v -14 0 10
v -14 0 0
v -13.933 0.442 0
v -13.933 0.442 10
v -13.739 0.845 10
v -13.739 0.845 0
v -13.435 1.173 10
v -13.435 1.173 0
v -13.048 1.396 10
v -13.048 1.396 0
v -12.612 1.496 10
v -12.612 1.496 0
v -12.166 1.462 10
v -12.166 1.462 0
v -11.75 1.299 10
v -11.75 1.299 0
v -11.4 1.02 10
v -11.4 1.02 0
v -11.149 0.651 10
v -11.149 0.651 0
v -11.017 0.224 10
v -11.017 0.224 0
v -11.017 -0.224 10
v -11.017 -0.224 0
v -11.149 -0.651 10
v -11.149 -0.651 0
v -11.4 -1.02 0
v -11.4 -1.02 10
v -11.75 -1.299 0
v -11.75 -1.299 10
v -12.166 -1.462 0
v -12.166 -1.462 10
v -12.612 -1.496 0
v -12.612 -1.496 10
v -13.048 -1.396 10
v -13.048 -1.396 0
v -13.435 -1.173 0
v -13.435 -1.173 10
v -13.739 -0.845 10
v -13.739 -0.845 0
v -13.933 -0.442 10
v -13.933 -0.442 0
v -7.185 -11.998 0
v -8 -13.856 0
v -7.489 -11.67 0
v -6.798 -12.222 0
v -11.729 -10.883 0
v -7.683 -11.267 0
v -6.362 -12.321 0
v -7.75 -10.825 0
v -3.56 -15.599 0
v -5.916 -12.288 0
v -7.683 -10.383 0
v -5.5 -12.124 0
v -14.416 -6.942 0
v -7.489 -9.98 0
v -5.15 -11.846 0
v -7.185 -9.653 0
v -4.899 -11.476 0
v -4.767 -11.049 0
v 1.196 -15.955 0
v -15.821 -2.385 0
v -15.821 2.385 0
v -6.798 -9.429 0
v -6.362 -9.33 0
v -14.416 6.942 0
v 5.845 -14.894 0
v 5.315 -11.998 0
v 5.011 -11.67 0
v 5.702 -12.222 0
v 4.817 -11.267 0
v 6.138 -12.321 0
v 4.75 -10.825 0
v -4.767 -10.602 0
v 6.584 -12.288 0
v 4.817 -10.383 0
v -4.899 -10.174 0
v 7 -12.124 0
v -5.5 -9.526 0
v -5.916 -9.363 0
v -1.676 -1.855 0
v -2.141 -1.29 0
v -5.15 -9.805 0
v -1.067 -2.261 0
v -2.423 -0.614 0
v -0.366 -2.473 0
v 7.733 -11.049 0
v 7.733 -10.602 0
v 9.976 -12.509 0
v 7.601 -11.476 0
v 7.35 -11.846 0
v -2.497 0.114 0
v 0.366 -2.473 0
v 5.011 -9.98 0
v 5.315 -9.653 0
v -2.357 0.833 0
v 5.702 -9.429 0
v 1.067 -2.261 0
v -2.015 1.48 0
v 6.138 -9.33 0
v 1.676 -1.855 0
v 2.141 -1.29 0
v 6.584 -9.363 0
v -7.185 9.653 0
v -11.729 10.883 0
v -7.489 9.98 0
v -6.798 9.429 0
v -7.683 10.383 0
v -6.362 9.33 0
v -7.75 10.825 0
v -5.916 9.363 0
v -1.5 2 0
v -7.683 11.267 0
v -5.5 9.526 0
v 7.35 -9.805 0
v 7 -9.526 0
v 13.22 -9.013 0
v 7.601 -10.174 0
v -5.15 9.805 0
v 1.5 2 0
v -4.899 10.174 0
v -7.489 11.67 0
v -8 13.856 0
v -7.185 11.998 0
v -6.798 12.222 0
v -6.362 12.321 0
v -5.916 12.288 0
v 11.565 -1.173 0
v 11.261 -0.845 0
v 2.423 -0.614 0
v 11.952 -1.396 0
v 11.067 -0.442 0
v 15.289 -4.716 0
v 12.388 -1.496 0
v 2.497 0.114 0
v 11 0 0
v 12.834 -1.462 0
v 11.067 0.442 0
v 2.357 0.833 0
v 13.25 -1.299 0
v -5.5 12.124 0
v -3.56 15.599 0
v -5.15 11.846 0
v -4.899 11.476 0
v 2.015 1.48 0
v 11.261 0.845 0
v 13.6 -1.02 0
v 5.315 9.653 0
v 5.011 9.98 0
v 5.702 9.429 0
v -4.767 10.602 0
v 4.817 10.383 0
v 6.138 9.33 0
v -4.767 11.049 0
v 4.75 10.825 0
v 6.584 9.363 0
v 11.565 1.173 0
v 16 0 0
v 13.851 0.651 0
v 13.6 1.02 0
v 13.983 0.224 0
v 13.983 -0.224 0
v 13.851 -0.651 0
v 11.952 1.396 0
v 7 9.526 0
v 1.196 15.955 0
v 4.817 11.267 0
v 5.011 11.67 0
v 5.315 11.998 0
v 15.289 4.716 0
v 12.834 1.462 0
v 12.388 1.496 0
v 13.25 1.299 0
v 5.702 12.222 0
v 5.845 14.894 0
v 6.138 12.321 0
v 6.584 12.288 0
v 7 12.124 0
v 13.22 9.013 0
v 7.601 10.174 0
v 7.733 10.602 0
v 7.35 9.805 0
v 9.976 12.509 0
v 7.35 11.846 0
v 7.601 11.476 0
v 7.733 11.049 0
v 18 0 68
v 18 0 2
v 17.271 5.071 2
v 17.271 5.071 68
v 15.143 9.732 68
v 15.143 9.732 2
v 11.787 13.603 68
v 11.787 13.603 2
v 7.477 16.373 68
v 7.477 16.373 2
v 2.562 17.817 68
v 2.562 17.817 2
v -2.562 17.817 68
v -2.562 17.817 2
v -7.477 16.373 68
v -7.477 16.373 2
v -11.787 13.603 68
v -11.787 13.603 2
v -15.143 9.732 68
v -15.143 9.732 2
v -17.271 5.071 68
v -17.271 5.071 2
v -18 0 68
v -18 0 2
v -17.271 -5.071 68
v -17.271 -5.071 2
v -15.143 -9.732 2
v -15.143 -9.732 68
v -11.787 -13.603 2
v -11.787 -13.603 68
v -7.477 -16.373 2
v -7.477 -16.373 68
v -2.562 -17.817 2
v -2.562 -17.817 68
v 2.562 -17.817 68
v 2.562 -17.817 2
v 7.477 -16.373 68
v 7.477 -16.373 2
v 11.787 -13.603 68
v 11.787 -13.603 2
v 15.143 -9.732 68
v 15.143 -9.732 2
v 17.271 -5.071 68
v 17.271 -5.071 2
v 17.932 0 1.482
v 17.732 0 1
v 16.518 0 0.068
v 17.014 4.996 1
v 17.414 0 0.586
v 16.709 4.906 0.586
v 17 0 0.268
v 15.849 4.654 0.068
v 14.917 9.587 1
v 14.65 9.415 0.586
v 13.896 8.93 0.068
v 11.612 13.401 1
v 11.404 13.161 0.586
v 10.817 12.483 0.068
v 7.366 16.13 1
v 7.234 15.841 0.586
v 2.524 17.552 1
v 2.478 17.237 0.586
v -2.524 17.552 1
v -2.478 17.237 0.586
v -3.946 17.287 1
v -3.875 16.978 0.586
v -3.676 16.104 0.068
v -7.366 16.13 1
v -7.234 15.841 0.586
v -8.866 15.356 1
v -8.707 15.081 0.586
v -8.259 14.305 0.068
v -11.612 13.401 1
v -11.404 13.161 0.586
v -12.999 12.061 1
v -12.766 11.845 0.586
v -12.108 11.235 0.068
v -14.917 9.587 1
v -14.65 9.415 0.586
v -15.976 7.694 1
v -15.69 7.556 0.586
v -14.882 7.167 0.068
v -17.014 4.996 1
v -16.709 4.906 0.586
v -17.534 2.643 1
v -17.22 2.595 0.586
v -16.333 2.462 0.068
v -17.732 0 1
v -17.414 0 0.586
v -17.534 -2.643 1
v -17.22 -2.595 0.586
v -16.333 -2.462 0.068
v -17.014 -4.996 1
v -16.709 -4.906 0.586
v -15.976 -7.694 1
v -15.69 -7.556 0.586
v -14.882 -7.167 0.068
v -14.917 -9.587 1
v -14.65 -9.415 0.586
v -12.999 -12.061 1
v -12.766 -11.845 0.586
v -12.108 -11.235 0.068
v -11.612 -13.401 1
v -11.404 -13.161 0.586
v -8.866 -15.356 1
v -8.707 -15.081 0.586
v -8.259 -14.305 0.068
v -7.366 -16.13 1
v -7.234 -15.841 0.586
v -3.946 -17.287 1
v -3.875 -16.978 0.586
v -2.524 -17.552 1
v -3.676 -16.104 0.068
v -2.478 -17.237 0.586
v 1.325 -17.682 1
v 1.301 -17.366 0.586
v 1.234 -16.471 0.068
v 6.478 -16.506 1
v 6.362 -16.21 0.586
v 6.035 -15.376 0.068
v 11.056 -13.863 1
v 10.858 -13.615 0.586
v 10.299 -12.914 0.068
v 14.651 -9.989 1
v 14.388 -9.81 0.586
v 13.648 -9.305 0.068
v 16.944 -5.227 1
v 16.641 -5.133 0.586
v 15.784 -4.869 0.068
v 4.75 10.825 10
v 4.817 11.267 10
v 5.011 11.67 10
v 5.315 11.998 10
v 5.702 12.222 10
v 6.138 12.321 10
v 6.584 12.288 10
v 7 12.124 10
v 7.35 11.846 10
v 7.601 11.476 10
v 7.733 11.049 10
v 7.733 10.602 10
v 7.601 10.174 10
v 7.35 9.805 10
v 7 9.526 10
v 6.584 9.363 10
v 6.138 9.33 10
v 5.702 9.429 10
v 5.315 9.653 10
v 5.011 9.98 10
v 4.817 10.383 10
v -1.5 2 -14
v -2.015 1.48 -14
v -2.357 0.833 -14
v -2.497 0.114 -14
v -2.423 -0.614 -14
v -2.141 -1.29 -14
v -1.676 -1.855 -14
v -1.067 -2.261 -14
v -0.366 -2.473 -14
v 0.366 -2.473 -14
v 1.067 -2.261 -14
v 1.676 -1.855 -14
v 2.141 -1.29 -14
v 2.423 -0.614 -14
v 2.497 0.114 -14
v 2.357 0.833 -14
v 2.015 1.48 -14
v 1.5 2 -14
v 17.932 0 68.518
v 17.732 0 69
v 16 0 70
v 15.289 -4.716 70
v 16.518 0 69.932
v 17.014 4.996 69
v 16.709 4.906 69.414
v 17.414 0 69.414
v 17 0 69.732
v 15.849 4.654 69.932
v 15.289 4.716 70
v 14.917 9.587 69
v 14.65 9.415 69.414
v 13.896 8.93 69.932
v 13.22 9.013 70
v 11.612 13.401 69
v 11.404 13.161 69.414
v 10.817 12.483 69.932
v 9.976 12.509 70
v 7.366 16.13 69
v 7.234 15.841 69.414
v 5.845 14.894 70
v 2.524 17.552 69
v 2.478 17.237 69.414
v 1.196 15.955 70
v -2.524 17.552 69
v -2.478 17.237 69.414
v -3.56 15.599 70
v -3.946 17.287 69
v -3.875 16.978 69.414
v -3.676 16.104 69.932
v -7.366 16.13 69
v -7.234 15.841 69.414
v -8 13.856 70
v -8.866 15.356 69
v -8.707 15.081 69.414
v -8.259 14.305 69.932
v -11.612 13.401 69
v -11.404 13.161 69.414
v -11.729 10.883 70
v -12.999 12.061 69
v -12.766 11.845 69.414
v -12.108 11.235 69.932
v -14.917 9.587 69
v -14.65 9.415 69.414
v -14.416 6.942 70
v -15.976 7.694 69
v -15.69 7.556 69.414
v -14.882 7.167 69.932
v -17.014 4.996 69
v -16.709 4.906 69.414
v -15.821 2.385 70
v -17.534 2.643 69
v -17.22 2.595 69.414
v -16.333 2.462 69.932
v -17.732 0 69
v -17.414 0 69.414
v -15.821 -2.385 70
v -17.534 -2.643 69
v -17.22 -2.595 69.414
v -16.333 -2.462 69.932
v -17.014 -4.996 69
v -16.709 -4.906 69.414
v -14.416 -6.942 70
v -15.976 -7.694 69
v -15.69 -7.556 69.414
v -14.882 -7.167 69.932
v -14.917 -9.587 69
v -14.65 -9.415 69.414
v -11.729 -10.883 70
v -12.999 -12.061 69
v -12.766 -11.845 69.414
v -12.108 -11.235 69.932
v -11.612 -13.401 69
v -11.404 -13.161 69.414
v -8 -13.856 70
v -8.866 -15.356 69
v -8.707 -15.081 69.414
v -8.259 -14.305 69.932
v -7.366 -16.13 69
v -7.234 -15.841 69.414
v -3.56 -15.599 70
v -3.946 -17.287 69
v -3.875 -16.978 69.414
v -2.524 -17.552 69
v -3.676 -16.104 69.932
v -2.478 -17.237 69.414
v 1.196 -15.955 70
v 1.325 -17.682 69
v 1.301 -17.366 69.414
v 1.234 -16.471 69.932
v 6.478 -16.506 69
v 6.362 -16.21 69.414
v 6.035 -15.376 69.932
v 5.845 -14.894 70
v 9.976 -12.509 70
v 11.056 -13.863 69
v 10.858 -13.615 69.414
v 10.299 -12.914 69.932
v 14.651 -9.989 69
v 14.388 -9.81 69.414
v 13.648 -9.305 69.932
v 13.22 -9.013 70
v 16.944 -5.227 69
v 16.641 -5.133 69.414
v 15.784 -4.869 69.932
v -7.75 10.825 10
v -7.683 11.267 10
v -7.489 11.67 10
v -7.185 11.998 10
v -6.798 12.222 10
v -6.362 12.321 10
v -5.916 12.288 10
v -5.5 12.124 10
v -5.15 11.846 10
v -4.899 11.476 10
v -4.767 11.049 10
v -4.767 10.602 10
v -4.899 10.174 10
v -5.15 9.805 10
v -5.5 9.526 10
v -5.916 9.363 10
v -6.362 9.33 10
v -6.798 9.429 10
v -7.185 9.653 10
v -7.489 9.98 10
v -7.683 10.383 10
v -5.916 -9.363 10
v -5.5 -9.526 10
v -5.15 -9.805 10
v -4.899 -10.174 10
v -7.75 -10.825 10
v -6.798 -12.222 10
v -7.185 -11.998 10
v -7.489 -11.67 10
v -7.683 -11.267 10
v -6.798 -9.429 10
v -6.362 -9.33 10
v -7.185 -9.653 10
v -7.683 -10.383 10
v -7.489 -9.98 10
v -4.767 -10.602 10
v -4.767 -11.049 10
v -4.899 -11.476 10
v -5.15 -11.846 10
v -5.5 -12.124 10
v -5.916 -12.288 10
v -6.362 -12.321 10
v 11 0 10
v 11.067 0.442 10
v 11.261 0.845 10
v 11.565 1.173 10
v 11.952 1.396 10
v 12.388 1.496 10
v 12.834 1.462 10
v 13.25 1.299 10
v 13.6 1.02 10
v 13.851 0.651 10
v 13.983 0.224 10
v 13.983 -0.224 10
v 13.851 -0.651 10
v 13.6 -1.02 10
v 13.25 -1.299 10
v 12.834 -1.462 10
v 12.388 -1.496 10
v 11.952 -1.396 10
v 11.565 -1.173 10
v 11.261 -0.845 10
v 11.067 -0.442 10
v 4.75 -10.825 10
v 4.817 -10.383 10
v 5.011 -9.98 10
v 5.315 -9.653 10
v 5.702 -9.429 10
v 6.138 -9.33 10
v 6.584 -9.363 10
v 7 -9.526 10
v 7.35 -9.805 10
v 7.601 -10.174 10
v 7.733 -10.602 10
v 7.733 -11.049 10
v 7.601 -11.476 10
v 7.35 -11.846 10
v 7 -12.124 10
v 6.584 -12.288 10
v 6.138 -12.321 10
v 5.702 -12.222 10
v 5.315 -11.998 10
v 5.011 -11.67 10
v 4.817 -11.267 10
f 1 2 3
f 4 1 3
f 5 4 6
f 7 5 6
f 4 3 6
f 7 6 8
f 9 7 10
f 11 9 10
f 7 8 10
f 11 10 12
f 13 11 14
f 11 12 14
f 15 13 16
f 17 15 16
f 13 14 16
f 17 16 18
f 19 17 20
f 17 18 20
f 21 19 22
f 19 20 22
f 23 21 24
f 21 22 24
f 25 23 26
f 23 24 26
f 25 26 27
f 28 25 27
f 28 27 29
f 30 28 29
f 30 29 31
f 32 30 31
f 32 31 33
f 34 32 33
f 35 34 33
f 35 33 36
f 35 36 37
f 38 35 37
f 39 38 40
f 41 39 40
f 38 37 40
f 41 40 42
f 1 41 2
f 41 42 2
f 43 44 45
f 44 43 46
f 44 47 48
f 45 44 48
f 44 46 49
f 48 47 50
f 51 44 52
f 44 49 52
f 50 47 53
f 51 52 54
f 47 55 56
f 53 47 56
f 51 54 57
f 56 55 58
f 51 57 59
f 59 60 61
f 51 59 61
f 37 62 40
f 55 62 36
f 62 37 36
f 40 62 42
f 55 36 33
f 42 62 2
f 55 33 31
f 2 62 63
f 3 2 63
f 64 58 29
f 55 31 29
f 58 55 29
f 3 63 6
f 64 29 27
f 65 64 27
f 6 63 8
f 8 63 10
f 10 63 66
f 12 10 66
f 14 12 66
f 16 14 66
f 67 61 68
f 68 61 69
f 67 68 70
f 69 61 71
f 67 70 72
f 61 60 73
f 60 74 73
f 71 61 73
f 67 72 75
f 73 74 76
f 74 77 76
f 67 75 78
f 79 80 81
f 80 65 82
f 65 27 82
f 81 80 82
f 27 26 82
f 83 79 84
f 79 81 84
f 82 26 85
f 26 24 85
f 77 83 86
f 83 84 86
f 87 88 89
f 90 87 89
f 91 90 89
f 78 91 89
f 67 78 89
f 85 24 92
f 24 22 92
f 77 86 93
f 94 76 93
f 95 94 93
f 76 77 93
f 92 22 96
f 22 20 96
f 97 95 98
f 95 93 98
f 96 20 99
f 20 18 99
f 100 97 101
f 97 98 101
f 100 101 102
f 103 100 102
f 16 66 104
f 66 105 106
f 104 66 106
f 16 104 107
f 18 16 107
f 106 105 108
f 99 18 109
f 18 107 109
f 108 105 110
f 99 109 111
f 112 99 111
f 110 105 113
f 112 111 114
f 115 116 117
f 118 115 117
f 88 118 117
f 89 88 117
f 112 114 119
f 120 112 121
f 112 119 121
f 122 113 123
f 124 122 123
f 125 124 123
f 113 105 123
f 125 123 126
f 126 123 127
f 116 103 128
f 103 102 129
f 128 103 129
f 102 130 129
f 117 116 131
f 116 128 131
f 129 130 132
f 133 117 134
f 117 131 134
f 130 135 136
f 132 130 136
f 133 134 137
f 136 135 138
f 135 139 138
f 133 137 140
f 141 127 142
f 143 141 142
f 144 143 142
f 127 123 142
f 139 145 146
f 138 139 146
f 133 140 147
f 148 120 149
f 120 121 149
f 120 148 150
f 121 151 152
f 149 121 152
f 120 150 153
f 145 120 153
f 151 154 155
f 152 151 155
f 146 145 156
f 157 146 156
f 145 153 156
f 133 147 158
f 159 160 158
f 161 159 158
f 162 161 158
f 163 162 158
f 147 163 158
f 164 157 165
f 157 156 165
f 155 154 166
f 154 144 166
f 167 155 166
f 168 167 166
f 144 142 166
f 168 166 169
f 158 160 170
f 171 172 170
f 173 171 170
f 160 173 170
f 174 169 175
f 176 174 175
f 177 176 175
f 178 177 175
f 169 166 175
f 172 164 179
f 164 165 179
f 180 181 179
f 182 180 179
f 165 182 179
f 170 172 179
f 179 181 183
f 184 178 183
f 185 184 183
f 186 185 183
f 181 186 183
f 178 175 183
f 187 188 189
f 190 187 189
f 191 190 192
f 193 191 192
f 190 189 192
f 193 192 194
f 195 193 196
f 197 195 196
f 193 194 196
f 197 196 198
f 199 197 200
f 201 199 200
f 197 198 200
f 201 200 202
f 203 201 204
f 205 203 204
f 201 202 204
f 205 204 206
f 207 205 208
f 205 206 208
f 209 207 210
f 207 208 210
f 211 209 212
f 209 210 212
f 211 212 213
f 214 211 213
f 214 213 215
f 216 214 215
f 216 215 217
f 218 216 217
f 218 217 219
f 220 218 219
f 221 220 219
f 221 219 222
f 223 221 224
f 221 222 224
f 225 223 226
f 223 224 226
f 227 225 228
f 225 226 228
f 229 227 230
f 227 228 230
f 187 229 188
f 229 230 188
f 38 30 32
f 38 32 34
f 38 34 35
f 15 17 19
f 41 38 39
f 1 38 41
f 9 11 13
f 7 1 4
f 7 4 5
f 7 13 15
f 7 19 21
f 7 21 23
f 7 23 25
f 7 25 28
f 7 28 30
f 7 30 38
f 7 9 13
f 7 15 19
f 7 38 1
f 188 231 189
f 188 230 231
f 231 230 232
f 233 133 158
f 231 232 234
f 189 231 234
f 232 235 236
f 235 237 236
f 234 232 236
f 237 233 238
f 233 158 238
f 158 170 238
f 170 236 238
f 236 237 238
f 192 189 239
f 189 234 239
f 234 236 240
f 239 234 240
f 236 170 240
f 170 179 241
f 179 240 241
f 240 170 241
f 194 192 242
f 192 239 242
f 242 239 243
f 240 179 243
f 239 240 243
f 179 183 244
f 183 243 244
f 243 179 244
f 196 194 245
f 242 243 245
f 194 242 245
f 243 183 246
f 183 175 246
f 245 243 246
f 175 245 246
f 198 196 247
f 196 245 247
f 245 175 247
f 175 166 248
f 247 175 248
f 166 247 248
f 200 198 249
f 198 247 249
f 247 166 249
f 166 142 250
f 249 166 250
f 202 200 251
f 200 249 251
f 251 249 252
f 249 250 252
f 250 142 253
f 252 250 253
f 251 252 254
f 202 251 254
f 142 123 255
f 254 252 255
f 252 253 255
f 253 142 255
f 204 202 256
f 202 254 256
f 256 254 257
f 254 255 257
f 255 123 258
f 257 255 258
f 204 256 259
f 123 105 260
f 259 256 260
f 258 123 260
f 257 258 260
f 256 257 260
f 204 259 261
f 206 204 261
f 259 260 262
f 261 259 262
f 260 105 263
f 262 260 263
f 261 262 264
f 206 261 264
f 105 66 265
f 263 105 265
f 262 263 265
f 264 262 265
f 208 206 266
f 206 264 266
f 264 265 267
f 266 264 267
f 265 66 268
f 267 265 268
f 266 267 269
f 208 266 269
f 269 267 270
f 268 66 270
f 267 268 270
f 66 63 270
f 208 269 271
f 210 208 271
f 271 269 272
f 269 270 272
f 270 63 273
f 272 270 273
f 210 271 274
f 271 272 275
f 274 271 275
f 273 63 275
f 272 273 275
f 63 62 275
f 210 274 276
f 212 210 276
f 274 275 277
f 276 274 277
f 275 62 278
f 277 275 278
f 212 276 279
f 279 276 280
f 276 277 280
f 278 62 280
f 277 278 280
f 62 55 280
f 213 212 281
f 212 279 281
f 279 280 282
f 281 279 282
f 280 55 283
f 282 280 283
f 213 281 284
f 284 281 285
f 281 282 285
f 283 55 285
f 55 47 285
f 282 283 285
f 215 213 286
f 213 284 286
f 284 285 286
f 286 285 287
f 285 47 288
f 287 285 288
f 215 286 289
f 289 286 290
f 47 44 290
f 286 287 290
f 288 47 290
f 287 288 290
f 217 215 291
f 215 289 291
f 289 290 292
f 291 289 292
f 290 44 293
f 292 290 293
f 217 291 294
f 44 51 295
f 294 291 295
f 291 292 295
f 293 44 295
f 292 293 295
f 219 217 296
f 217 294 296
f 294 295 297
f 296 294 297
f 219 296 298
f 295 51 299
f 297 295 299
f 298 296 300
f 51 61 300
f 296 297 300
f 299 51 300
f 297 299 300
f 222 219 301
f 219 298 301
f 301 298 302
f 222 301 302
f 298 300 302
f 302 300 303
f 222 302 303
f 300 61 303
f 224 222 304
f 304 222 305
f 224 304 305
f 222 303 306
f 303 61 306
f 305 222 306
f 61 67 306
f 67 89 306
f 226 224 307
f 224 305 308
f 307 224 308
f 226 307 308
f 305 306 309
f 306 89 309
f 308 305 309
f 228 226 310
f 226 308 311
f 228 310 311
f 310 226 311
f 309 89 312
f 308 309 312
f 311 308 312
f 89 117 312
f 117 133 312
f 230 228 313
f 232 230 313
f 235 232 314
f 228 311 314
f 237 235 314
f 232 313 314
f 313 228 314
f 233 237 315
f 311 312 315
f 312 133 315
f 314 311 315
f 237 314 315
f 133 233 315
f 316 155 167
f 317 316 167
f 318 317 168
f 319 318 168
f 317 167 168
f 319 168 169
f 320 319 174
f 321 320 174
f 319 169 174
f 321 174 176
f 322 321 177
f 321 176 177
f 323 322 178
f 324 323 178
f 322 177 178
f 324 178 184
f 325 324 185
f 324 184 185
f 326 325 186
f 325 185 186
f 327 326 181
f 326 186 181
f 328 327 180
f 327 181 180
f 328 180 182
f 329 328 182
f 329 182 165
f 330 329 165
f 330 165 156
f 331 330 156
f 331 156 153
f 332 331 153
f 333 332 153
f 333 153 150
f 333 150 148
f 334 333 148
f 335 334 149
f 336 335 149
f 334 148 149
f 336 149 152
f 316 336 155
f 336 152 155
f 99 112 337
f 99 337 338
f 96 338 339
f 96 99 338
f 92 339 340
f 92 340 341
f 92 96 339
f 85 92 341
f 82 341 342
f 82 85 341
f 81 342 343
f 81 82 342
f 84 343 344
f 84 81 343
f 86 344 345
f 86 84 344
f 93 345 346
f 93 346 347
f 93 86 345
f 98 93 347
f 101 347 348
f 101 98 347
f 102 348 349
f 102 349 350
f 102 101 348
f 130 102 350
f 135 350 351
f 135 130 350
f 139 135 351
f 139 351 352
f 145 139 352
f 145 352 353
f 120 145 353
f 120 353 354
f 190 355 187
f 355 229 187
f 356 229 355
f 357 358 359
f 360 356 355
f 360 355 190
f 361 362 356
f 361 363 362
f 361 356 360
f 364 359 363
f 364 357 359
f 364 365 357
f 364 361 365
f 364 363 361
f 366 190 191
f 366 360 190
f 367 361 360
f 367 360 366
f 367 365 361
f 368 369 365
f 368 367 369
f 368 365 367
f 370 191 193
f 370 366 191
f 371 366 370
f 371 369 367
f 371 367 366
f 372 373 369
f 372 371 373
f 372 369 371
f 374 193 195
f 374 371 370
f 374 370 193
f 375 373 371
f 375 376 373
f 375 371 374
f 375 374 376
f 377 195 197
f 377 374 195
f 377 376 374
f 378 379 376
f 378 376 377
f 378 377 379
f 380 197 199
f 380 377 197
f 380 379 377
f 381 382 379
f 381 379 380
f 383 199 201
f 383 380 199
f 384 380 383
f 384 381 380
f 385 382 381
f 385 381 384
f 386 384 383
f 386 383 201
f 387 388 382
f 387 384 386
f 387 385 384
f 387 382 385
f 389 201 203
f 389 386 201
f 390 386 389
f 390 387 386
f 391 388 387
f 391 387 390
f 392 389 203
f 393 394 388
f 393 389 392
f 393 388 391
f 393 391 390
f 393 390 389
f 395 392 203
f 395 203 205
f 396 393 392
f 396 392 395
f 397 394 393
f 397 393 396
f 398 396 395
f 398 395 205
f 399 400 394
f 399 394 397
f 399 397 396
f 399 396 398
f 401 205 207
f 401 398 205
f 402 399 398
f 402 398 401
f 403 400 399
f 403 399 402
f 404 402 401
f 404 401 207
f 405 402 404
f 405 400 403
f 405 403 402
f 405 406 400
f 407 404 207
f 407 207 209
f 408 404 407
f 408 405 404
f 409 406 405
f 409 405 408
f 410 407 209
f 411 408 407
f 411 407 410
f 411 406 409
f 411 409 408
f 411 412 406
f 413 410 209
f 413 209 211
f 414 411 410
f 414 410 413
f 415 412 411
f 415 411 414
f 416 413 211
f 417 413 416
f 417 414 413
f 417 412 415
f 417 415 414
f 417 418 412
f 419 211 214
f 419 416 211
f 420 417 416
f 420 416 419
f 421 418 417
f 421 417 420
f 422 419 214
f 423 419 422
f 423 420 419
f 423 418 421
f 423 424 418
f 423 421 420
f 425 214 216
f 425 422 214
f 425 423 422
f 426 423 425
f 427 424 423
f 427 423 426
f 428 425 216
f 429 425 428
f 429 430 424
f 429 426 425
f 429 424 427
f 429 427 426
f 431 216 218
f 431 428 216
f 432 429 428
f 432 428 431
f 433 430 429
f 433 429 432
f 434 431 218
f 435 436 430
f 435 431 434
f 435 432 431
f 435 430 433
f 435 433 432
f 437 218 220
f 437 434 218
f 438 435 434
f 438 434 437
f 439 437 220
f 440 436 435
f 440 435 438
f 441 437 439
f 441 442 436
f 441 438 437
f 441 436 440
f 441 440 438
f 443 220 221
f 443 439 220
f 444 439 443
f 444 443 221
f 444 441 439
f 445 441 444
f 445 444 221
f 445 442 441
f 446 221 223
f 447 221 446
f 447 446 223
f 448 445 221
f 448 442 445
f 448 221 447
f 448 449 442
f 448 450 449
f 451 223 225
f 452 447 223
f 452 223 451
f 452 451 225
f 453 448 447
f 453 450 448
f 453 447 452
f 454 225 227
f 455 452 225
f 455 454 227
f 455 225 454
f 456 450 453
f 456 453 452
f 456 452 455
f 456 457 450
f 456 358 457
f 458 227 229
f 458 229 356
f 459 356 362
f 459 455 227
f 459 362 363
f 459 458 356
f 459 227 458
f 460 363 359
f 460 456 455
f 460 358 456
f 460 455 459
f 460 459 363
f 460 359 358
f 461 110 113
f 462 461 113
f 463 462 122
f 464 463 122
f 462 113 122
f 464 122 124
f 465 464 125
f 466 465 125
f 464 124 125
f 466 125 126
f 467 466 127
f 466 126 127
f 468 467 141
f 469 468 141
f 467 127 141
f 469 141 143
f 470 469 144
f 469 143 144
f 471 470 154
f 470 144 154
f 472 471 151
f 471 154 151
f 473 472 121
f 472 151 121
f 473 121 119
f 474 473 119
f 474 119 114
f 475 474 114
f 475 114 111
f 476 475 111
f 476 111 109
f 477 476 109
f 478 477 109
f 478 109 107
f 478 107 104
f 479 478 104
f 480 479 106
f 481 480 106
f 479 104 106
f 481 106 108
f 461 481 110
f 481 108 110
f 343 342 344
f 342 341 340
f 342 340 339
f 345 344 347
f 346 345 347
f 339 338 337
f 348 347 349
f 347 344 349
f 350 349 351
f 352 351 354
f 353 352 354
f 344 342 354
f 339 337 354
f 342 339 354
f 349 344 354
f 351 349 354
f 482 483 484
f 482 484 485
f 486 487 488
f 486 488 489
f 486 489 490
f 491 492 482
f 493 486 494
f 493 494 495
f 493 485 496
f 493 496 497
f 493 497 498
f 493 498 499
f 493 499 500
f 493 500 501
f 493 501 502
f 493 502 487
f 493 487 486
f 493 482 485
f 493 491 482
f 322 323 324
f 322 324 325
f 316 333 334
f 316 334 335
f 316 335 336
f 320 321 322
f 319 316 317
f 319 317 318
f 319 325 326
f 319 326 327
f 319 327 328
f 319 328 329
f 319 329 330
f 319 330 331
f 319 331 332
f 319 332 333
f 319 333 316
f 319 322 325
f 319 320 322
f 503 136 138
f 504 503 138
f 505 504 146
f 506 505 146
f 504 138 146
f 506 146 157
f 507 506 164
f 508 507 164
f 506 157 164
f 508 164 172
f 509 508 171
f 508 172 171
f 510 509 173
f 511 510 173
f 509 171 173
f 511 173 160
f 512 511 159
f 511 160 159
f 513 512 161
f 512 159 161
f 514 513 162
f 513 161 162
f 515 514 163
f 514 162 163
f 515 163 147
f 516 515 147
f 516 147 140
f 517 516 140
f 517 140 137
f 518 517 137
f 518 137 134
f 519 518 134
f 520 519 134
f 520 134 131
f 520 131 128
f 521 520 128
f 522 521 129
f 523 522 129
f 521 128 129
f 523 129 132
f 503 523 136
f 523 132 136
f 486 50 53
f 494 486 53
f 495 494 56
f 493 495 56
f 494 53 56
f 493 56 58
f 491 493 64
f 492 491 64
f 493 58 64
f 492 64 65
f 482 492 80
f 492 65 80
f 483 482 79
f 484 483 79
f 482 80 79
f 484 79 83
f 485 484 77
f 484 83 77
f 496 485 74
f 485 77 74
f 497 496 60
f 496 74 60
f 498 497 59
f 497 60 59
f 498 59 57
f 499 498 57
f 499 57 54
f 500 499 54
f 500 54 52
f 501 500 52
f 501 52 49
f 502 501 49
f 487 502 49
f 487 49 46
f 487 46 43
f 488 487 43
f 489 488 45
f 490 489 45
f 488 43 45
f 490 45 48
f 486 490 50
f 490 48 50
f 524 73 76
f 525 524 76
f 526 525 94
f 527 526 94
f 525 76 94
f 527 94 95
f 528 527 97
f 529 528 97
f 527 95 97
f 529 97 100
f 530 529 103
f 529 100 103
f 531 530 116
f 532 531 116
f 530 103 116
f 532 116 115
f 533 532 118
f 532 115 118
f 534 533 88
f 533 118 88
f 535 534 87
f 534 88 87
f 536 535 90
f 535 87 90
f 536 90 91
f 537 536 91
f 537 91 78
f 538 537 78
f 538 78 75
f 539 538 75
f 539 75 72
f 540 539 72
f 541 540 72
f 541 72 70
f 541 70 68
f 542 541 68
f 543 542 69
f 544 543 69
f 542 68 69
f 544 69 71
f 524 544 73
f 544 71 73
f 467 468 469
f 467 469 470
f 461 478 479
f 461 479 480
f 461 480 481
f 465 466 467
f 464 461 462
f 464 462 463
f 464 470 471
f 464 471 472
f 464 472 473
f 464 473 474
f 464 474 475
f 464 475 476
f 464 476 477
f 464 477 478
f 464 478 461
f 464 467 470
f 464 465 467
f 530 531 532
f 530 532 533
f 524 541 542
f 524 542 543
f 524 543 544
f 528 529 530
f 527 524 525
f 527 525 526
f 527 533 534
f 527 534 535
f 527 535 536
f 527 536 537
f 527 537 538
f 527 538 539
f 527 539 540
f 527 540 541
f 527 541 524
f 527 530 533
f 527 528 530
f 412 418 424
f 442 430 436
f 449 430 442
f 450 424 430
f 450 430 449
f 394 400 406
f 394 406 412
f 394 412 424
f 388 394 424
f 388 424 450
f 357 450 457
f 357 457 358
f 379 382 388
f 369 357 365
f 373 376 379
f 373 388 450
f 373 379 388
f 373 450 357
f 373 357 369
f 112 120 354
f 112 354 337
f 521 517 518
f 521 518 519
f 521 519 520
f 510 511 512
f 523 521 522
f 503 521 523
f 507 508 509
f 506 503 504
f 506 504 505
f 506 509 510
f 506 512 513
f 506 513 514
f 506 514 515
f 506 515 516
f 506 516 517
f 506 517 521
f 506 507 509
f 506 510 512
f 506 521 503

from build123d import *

# Parameters (mm, degrees)
SKETCH1_R           = 18
BOSS_EXTRUDE1_DEPTH = 70
BOSS_EXTRUDE2_DEPTH = 14
FILLET1_R           = 2
SKETCH3_R           = 1.5
CUT_EXTRUDE1_DEPTH  = 10


with BuildPart() as part:
    # Sketch1 → Boss-Extrude1 (new body)
    with BuildSketch(Plane.XY):
        Circle(SKETCH1_R)
    extrude(amount=BOSS_EXTRUDE1_DEPTH)

    # Sketch2 → Boss-Extrude2 (add)
    with BuildSketch(Plane(origin=(0, 0, 0), x_dir=(-1, 0, 0), z_dir=(0, 0, -1))):
        with BuildLine():
            Line((-1.5, 2), (1.5, 2))
            ThreePointArc((1.5, 2), (0, -2.5), (-1.5, 2))
        make_face()
    extrude(amount=BOSS_EXTRUDE2_DEPTH)

    # Fillet1
    fillet1_edges = [part.edges().sort_by_distance(p)[0] for p in [
        (-18, 0, 0),
        (-18, 0, 70),
    ]]
    fillet(fillet1_edges, radius=FILLET1_R)

    # Sketch3 → Cut-Extrude1 (cut)
    with BuildSketch(Plane(origin=(0, 0, 0), x_dir=(-1, 0, 0), z_dir=(0, 0, -1))):
        with Locations((-12.5, 0)):
            Circle(SKETCH3_R)
        with Locations((-6.25, 10.825317547)):
            Circle(SKETCH3_R)
        with Locations((6.25, 10.825317547)):
            Circle(SKETCH3_R)
        with Locations((12.5, 0)):
            Circle(SKETCH3_R)
        with Locations((6.25, -10.825317547)):
            Circle(SKETCH3_R)
        with Locations((-6.25, -10.825317547)):
            Circle(SKETCH3_R)
    extrude(amount=-CUT_EXTRUDE1_DEPTH, mode=Mode.SUBTRACT)


solid = part.part
